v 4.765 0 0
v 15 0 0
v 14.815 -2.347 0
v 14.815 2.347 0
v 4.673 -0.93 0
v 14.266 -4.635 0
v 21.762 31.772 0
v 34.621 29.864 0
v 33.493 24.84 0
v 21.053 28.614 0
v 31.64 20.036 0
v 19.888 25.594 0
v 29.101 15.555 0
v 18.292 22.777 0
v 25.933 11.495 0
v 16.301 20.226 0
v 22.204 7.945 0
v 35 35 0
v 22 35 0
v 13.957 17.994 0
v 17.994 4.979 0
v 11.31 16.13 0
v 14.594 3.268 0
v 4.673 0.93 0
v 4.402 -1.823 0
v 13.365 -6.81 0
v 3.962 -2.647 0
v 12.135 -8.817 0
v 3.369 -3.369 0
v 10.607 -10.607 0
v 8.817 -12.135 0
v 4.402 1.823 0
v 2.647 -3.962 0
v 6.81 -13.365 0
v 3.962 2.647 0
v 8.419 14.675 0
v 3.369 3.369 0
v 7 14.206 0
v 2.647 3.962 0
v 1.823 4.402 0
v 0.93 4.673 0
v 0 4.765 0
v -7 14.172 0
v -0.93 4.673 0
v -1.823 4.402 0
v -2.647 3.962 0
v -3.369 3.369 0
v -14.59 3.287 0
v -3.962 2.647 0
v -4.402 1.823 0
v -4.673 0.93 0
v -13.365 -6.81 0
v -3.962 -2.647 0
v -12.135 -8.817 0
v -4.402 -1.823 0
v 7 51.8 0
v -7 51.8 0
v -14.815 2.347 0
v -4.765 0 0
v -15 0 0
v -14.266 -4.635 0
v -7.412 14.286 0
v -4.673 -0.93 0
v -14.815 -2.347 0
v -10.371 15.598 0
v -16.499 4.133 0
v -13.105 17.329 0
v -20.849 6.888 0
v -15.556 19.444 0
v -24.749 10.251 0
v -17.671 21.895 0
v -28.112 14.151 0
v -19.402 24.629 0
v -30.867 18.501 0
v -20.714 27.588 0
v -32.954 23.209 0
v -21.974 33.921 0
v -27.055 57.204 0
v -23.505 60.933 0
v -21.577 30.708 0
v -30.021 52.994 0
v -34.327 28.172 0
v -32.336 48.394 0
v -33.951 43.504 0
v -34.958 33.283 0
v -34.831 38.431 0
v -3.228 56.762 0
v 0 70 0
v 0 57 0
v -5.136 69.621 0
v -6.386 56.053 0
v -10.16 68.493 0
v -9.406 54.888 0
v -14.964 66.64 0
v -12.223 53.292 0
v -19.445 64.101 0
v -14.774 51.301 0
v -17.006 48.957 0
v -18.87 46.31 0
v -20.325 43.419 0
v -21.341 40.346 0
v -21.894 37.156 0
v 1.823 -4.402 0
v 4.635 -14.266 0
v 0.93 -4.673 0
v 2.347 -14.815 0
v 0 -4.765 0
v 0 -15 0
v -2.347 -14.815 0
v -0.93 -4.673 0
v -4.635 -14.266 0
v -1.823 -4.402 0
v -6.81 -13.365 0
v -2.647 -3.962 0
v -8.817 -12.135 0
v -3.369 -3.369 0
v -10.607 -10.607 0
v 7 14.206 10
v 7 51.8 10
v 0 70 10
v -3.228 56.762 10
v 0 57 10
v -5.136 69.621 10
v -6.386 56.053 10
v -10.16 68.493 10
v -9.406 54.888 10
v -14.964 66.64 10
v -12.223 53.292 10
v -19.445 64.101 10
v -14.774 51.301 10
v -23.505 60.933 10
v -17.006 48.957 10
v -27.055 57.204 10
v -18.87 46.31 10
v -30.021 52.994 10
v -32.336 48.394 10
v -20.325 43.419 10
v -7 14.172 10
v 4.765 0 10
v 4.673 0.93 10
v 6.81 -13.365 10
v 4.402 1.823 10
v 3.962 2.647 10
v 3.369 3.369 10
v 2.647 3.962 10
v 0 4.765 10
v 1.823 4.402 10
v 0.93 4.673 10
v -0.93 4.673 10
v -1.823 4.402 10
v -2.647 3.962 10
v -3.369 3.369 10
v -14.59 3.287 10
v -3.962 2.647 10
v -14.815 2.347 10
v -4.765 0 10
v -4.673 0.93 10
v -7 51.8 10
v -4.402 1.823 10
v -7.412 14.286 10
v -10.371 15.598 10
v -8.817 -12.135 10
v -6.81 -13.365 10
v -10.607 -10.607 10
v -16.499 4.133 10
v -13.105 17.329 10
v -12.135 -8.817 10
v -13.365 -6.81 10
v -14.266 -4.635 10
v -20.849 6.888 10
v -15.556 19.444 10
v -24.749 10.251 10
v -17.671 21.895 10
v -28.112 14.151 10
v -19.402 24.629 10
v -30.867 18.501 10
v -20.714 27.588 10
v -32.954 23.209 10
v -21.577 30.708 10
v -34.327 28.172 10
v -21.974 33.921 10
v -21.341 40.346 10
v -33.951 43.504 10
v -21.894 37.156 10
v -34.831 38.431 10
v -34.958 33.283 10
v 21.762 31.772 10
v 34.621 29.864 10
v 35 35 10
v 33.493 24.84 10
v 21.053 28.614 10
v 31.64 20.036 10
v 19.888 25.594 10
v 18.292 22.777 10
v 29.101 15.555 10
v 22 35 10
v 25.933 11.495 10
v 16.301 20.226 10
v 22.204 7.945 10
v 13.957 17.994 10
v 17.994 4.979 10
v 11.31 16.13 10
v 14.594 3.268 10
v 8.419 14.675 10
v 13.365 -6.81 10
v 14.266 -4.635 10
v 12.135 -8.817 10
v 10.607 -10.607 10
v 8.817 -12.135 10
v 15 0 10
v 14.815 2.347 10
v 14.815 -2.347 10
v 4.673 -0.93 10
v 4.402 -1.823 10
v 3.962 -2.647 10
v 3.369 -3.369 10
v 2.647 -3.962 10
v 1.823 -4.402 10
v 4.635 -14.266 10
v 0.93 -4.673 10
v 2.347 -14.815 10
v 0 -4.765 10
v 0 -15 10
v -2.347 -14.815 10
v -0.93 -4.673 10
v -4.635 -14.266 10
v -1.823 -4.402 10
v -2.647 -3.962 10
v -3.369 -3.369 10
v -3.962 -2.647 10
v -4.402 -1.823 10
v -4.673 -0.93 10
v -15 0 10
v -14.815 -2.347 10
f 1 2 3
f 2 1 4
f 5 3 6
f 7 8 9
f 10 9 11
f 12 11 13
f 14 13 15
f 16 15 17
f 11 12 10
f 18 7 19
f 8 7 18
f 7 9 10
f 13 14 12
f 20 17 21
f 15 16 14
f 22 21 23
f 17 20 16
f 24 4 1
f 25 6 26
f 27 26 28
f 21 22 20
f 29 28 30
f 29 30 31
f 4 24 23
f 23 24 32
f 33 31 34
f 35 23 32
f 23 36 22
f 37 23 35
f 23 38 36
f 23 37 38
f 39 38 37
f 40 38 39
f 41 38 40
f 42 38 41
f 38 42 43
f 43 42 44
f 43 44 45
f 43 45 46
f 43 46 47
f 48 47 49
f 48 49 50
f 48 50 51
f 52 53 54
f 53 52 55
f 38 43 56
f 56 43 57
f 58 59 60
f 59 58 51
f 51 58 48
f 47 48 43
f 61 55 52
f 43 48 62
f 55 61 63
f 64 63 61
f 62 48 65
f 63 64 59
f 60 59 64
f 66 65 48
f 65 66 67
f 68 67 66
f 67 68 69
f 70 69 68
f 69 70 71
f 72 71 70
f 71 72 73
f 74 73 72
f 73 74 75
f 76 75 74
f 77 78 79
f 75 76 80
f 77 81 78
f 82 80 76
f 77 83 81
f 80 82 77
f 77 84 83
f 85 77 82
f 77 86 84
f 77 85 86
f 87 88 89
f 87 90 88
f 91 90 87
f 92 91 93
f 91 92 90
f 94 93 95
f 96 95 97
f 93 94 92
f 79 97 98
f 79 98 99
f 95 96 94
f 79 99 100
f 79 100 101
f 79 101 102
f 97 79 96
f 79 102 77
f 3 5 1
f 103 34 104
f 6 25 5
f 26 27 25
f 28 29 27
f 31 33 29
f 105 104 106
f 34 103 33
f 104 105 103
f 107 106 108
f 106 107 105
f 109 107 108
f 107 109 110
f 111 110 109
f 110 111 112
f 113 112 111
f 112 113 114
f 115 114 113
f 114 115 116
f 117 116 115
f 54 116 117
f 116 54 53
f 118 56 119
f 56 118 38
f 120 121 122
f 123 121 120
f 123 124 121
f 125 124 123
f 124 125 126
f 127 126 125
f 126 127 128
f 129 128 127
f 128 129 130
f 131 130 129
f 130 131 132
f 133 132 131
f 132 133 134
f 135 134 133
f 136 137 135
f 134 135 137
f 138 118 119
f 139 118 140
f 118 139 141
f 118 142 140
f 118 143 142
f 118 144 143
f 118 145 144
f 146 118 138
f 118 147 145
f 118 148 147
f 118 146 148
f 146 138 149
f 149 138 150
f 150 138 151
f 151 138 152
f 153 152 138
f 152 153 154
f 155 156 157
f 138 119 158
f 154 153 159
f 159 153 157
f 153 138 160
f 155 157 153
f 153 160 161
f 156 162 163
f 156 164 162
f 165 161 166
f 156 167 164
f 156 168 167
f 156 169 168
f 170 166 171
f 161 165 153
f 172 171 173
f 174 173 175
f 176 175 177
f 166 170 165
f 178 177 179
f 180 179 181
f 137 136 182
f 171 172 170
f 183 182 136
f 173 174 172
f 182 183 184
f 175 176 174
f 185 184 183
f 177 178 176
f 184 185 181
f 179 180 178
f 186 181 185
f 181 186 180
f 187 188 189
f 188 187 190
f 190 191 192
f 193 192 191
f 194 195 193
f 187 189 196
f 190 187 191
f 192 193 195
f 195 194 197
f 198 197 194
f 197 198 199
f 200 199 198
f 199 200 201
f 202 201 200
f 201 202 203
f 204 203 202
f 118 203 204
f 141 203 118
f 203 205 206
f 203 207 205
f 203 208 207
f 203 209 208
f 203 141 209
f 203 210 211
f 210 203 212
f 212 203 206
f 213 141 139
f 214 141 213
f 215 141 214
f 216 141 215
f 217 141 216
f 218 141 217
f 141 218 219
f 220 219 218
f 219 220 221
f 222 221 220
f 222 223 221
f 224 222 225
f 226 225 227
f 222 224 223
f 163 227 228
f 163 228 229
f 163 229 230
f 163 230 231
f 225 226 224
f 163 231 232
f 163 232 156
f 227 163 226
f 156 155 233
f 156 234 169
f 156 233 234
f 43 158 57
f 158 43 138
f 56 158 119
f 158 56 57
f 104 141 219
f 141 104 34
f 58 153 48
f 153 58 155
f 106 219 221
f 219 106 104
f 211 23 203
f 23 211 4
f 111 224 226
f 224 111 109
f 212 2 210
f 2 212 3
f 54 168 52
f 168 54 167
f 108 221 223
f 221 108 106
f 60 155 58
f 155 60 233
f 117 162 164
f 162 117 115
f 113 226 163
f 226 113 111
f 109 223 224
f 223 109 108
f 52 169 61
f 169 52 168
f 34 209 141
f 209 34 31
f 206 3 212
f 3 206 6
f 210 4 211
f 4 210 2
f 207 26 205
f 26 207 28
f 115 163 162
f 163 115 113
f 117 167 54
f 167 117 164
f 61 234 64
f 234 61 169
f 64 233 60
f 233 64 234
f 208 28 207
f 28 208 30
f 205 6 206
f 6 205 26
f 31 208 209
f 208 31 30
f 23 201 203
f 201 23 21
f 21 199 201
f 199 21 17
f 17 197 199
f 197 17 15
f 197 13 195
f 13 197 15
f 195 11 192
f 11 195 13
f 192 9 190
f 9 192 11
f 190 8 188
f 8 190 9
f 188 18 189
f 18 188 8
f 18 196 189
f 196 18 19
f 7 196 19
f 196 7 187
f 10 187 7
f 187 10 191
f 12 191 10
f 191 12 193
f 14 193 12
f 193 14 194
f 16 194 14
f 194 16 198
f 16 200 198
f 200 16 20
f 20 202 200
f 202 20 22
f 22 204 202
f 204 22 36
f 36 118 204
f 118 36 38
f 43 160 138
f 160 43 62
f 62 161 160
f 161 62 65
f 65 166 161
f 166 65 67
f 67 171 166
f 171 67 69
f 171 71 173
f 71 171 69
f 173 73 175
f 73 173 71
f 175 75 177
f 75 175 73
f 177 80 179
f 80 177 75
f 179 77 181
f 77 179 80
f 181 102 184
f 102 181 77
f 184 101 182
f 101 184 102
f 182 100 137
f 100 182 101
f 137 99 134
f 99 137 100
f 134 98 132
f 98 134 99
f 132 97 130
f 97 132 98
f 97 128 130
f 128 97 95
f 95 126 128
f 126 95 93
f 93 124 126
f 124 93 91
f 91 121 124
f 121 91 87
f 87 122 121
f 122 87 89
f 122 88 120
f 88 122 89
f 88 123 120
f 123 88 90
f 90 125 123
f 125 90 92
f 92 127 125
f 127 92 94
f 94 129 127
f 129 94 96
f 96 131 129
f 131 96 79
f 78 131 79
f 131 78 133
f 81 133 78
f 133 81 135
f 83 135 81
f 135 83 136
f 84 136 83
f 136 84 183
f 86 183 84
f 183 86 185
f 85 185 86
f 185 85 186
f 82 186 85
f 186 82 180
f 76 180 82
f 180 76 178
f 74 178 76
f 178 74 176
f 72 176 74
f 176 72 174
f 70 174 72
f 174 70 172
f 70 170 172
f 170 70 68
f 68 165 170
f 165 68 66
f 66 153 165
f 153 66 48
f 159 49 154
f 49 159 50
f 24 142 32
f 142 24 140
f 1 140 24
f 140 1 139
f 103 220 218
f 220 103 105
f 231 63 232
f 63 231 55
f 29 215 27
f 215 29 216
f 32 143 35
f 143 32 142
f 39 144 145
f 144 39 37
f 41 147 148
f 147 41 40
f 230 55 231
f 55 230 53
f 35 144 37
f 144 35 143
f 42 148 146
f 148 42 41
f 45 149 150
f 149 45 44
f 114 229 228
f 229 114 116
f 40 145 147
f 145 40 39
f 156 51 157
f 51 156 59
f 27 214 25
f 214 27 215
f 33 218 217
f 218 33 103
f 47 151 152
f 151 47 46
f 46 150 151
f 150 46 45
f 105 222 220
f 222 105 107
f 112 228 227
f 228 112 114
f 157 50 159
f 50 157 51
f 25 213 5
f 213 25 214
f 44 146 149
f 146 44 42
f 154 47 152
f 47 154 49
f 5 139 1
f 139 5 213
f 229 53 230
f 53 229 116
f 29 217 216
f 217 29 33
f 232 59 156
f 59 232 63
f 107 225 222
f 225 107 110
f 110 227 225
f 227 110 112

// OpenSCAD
$fn = 32;

// ----------------------------------------------------------------------
// Hook: 70 mm shank into a 22 mm curl, 10 mm thick
// ----------------------------------------------------------------------

// --- parameters (mm) ---
shank_len = 70;           // shank length from the boss centre
shank_w = 14;             // shank width
boss_d = 30;              // boss diameter
bore_d = 9.53;            // boss bore
curl_in = 22;             // curl inner radius
curl_out = 35;            // curl outer radius
curl_sweep = 270;         // curl sweep angle
hook_t = 10;              // hook thickness

shank_profile = [[-7, 51.8], [7, 51.8], [7, 13], [-7, 13]];
boss_profile = [[15, 0], [14.815, 2.347], [14.266, 4.635], [13.365, 6.81], [12.135, 8.817], [10.607, 10.607], [8.817, 12.135], [6.81, 13.365], [4.635, 14.266], [2.347, 14.815], [0, 15], [-2.347, 14.815], [-4.635, 14.266], [-6.81, 13.365], [-8.817, 12.135], [-10.607, 10.607], [-12.135, 8.817], [-13.365, 6.81], [-14.266, 4.635], [-14.815, 2.347], [-15, 0], [-14.815, -2.347], [-14.266, -4.635], [-13.365, -6.81], [-12.135, -8.817], [-10.607, -10.607], [-8.817, -12.135], [-6.81, -13.365], [-4.635, -14.266], [-2.347, -14.815], [0, -15], [2.347, -14.815], [4.635, -14.266], [6.81, -13.365], [8.817, -12.135], [10.607, -10.607], [12.135, -8.817], [13.365, -6.81], [14.266, -4.635], [14.815, -2.347]];
curl_profile = [[0, 70], [-5.136, 69.621], [-10.16, 68.493], [-14.964, 66.64], [-19.445, 64.101], [-23.505, 60.933], [-27.055, 57.204], [-30.021, 52.994], [-32.336, 48.394], [-33.951, 43.504], [-34.831, 38.431], [-34.958, 33.283], [-34.327, 28.172], [-32.954, 23.209], [-30.867, 18.501], [-28.112, 14.151], [-24.749, 10.251], [-20.849, 6.888], [-16.499, 4.133], [-11.791, 2.046], [-6.828, 0.673], [-1.717, 0.042], [3.431, 0.169], [8.504, 1.049], [13.394, 2.664], [17.994, 4.979], [22.204, 7.945], [25.933, 11.495], [29.101, 15.555], [31.64, 20.036], [33.493, 24.84], [34.621, 29.864], [35, 35], [22, 35], [21.762, 31.772], [21.053, 28.614], [19.888, 25.594], [18.292, 22.777], [16.301, 20.226], [13.957, 17.994], [11.31, 16.13], [8.419, 14.675], [5.346, 13.659], [2.156, 13.106], [-1.079, 13.026], [-4.292, 13.423], [-7.412, 14.286], [-10.371, 15.598], [-13.105, 17.329], [-15.556, 19.444], [-17.671, 21.895], [-19.402, 24.629], [-20.714, 27.588], [-21.577, 30.708], [-21.974, 33.921], [-21.894, 37.156], [-21.341, 40.346], [-20.325, 43.419], [-18.87, 46.31], [-17.006, 48.957], [-14.774, 51.301], [-12.223, 53.292], [-9.406, 54.888], [-6.386, 56.053], [-3.228, 56.762], [0, 57]];

difference() {
  union() {
    /* three overlapping outlines: shank, boss and the smooth curl */
    linear_extrude(height = hook_t) polygon(shank_profile);
    linear_extrude(height = hook_t) polygon(boss_profile);
    linear_extrude(height = hook_t) polygon(curl_profile);
  }
  translate([0, 0, -2.5]) cylinder(h = hook_t + 5, d = bore_d);
}
